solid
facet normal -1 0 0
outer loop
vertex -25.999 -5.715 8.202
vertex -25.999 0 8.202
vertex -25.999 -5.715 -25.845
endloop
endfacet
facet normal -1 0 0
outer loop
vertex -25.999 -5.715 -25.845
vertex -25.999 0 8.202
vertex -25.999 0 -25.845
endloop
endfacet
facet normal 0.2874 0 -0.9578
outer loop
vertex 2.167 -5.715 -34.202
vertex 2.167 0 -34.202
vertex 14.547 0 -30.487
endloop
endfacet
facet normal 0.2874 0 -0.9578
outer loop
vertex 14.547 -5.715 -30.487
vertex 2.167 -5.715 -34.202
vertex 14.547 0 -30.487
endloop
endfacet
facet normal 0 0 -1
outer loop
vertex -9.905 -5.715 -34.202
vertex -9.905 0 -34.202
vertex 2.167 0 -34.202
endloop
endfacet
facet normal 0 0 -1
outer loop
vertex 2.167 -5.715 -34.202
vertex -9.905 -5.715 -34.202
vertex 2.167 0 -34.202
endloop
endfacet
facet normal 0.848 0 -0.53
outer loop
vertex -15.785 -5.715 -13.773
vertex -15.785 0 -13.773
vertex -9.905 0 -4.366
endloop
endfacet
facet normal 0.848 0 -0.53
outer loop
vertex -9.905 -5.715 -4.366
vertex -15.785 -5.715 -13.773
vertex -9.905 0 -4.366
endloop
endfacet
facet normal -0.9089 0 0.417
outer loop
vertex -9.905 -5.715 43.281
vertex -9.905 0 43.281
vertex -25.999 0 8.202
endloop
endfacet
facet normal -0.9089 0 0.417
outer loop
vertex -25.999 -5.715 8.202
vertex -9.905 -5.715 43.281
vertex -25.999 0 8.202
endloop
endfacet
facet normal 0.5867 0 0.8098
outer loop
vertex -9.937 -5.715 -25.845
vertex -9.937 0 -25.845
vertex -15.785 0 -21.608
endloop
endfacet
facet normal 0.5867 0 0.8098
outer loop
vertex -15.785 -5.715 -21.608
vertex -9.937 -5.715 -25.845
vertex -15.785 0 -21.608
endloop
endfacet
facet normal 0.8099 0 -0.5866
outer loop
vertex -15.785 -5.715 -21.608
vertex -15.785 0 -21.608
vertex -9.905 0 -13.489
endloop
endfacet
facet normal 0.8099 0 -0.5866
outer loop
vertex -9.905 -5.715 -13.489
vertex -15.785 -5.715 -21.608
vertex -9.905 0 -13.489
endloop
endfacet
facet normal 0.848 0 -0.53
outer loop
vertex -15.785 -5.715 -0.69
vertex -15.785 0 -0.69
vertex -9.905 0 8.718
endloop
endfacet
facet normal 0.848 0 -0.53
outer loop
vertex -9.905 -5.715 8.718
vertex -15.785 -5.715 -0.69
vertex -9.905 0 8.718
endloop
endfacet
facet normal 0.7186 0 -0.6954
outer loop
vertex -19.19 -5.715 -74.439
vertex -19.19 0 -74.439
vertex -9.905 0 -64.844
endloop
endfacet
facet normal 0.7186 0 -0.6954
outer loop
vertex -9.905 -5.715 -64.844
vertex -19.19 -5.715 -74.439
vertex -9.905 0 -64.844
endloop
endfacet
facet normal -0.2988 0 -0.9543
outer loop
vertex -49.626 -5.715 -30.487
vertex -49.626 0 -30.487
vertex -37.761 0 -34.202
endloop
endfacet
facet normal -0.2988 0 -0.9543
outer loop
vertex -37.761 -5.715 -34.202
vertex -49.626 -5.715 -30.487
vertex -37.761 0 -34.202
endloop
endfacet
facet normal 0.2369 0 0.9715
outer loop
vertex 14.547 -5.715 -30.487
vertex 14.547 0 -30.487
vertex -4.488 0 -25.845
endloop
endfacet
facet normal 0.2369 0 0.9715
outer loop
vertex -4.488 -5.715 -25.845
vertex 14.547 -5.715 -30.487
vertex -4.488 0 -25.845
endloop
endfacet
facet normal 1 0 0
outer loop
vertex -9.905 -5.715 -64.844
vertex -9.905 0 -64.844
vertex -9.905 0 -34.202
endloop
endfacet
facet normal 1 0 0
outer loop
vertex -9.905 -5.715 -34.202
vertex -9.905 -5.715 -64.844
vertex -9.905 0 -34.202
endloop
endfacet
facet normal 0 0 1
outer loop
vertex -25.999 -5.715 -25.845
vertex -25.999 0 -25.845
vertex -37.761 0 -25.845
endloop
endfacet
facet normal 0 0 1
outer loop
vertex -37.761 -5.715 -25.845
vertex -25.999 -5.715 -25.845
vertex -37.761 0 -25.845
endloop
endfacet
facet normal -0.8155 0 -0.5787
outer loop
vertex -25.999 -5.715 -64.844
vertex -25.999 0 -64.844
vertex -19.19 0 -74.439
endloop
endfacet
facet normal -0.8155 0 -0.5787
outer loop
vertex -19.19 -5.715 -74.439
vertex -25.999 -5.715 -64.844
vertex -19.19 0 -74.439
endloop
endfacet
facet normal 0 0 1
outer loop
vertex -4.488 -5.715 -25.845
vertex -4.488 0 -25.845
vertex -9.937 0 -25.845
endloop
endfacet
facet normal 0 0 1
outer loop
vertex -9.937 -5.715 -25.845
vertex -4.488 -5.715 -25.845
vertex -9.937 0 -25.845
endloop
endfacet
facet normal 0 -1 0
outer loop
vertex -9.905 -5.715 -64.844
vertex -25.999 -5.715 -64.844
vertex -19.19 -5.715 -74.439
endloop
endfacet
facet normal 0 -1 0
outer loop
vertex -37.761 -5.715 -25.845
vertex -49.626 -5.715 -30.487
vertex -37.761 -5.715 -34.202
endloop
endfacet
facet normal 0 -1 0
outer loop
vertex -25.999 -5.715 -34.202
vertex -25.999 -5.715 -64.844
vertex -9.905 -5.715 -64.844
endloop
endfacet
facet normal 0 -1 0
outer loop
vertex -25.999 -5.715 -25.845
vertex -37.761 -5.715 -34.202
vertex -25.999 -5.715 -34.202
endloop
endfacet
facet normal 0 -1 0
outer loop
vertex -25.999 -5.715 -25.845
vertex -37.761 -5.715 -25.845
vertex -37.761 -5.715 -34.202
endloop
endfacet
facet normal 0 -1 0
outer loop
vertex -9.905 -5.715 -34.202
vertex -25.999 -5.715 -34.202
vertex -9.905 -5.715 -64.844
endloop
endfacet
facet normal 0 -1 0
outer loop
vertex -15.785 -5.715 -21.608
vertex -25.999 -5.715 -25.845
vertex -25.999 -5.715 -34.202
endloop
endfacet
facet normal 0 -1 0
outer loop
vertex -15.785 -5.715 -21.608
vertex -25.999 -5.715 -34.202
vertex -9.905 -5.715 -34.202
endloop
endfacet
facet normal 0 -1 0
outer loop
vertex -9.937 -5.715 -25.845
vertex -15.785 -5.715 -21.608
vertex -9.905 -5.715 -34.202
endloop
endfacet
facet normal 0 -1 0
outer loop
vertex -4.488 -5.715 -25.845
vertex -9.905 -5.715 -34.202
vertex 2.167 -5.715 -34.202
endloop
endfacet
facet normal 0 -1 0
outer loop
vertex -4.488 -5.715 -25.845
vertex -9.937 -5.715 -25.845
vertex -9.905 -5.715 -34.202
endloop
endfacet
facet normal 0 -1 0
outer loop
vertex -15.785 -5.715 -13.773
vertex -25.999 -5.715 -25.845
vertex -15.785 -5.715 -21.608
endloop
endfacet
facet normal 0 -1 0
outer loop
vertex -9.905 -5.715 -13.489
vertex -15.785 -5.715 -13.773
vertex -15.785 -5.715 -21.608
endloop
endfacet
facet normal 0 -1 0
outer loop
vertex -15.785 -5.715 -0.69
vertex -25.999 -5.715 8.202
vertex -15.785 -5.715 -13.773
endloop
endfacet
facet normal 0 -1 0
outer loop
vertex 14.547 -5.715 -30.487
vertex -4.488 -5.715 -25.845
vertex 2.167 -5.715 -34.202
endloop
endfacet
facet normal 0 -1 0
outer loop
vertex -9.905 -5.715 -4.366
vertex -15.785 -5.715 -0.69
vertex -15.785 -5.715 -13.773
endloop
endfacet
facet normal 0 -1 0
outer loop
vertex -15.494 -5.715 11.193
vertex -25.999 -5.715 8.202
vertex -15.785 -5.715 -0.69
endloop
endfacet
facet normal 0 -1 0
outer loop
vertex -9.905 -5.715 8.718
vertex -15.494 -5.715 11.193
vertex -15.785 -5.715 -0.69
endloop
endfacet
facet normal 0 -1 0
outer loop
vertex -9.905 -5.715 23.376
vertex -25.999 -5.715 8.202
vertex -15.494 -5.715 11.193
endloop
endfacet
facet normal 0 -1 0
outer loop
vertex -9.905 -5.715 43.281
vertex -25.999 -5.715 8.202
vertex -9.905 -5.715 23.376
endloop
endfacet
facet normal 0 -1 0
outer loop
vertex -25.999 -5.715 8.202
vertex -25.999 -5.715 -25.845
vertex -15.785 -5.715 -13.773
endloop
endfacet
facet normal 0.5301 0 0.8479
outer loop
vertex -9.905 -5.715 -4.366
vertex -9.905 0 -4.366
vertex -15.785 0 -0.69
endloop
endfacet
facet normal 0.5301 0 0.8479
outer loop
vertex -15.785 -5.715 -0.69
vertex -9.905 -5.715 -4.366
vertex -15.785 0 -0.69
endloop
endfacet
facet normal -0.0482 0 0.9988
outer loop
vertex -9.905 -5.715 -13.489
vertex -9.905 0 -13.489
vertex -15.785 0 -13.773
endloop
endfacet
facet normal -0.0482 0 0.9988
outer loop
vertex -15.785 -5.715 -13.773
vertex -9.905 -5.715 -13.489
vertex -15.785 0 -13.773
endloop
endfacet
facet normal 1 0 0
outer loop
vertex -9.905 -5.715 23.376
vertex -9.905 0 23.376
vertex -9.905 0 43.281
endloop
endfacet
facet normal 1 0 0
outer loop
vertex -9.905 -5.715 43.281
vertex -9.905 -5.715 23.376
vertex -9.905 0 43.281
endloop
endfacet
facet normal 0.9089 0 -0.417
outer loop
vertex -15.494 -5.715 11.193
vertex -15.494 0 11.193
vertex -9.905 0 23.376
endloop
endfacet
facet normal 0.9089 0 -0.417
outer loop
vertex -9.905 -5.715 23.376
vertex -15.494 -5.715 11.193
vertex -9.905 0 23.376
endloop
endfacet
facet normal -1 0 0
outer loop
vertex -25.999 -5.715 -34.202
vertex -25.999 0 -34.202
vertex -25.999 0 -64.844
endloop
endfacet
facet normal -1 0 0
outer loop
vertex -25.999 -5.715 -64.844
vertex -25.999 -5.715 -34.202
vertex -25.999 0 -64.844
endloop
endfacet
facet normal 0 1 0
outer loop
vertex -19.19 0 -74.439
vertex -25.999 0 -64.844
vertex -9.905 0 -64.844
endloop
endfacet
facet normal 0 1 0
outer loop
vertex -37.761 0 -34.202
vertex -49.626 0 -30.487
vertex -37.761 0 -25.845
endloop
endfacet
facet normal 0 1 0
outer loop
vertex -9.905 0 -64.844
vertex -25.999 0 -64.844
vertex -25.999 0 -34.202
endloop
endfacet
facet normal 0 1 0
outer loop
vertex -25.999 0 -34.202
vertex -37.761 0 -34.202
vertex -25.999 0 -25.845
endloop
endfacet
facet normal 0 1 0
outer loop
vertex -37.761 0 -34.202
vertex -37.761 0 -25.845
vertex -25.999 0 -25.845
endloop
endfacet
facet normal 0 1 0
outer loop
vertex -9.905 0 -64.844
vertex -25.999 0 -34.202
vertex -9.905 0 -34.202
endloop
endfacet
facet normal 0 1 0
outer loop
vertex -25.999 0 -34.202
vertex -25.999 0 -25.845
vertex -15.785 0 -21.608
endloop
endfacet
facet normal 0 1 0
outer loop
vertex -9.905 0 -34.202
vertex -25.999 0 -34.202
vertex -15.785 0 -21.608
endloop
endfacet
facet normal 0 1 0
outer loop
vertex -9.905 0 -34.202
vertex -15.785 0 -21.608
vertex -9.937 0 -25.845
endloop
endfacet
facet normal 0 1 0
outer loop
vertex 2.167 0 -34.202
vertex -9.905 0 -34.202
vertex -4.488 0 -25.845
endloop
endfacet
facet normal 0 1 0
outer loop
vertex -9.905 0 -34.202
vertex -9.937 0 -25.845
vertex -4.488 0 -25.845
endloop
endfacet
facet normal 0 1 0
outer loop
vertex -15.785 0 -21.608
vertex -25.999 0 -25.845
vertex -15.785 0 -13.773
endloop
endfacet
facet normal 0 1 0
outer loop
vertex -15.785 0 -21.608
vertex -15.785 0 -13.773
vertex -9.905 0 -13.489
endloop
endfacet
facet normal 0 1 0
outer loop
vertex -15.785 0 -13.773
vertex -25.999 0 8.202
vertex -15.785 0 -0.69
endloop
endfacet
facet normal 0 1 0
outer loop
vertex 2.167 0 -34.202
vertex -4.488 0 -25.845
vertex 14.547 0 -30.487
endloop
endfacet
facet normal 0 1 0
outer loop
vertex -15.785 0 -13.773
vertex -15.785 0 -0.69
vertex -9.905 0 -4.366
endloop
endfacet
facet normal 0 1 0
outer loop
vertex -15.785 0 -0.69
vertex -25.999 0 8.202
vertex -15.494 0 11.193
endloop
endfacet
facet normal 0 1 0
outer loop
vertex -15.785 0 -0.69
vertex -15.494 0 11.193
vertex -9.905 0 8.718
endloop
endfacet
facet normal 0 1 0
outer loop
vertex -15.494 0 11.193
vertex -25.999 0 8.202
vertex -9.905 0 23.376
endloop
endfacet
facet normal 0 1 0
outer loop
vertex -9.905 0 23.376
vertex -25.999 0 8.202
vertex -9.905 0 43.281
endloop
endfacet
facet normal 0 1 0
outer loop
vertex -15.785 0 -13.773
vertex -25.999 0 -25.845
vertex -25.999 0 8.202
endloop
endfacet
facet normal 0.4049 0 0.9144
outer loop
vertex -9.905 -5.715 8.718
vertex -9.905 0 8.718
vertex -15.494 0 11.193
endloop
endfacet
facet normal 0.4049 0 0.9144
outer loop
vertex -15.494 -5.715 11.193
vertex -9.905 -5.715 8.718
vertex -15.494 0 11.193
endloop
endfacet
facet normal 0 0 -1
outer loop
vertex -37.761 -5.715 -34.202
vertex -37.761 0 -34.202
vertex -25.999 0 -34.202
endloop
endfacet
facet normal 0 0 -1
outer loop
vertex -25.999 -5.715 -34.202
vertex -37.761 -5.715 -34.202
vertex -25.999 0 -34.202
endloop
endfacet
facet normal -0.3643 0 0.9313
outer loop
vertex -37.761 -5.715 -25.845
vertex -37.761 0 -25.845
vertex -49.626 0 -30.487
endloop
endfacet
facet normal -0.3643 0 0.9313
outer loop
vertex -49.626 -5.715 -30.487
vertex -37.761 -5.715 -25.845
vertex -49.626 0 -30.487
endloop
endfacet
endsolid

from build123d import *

# Parameters (mm, degrees)
F1_DEPTH = 5.715


with BuildPart() as f1:
    # F0 (on Front) → F1 (new body)
    with BuildSketch(Plane.XZ):
        Polygon((-9.904526, 23.375541), (-9.904526, 43.280635), (-25.999382, 8.202187), (-25.999382, -25.844624), (-9.936704, -25.844624), (-15.785338, -21.608118), (-9.904526, -13.489466), (-15.785338, -13.773482), (-9.904526, -4.36581), (-15.785338, -0.689667), (-9.904526, 8.718005), (-15.493959, 11.193473), align=None)
        Polygon((-9.936704, -25.844624), (-25.999382, -25.844624), (-37.761007, -25.844624), (-49.625799, -30.48737), (-37.761007, -34.201566), (-25.999382, -34.201566), (-9.904526, -34.201566), (2.166617, -34.201566), (14.547272, -30.48737), (-4.487994, -25.844624), (-9.904526, -25.844624), (-9.904526, -25.867933), align=None)
        Polygon((-9.904526, -25.844624), (-9.936704, -25.844624), (-9.904526, -25.867933), align=None)
        Polygon((-9.904526, -34.201566), (-25.999382, -34.201566), (-25.999382, -64.843699), (-19.190019, -74.438706), (-9.904526, -64.843699), align=None)
    extrude(amount=F1_DEPTH)


solid = f1.part
